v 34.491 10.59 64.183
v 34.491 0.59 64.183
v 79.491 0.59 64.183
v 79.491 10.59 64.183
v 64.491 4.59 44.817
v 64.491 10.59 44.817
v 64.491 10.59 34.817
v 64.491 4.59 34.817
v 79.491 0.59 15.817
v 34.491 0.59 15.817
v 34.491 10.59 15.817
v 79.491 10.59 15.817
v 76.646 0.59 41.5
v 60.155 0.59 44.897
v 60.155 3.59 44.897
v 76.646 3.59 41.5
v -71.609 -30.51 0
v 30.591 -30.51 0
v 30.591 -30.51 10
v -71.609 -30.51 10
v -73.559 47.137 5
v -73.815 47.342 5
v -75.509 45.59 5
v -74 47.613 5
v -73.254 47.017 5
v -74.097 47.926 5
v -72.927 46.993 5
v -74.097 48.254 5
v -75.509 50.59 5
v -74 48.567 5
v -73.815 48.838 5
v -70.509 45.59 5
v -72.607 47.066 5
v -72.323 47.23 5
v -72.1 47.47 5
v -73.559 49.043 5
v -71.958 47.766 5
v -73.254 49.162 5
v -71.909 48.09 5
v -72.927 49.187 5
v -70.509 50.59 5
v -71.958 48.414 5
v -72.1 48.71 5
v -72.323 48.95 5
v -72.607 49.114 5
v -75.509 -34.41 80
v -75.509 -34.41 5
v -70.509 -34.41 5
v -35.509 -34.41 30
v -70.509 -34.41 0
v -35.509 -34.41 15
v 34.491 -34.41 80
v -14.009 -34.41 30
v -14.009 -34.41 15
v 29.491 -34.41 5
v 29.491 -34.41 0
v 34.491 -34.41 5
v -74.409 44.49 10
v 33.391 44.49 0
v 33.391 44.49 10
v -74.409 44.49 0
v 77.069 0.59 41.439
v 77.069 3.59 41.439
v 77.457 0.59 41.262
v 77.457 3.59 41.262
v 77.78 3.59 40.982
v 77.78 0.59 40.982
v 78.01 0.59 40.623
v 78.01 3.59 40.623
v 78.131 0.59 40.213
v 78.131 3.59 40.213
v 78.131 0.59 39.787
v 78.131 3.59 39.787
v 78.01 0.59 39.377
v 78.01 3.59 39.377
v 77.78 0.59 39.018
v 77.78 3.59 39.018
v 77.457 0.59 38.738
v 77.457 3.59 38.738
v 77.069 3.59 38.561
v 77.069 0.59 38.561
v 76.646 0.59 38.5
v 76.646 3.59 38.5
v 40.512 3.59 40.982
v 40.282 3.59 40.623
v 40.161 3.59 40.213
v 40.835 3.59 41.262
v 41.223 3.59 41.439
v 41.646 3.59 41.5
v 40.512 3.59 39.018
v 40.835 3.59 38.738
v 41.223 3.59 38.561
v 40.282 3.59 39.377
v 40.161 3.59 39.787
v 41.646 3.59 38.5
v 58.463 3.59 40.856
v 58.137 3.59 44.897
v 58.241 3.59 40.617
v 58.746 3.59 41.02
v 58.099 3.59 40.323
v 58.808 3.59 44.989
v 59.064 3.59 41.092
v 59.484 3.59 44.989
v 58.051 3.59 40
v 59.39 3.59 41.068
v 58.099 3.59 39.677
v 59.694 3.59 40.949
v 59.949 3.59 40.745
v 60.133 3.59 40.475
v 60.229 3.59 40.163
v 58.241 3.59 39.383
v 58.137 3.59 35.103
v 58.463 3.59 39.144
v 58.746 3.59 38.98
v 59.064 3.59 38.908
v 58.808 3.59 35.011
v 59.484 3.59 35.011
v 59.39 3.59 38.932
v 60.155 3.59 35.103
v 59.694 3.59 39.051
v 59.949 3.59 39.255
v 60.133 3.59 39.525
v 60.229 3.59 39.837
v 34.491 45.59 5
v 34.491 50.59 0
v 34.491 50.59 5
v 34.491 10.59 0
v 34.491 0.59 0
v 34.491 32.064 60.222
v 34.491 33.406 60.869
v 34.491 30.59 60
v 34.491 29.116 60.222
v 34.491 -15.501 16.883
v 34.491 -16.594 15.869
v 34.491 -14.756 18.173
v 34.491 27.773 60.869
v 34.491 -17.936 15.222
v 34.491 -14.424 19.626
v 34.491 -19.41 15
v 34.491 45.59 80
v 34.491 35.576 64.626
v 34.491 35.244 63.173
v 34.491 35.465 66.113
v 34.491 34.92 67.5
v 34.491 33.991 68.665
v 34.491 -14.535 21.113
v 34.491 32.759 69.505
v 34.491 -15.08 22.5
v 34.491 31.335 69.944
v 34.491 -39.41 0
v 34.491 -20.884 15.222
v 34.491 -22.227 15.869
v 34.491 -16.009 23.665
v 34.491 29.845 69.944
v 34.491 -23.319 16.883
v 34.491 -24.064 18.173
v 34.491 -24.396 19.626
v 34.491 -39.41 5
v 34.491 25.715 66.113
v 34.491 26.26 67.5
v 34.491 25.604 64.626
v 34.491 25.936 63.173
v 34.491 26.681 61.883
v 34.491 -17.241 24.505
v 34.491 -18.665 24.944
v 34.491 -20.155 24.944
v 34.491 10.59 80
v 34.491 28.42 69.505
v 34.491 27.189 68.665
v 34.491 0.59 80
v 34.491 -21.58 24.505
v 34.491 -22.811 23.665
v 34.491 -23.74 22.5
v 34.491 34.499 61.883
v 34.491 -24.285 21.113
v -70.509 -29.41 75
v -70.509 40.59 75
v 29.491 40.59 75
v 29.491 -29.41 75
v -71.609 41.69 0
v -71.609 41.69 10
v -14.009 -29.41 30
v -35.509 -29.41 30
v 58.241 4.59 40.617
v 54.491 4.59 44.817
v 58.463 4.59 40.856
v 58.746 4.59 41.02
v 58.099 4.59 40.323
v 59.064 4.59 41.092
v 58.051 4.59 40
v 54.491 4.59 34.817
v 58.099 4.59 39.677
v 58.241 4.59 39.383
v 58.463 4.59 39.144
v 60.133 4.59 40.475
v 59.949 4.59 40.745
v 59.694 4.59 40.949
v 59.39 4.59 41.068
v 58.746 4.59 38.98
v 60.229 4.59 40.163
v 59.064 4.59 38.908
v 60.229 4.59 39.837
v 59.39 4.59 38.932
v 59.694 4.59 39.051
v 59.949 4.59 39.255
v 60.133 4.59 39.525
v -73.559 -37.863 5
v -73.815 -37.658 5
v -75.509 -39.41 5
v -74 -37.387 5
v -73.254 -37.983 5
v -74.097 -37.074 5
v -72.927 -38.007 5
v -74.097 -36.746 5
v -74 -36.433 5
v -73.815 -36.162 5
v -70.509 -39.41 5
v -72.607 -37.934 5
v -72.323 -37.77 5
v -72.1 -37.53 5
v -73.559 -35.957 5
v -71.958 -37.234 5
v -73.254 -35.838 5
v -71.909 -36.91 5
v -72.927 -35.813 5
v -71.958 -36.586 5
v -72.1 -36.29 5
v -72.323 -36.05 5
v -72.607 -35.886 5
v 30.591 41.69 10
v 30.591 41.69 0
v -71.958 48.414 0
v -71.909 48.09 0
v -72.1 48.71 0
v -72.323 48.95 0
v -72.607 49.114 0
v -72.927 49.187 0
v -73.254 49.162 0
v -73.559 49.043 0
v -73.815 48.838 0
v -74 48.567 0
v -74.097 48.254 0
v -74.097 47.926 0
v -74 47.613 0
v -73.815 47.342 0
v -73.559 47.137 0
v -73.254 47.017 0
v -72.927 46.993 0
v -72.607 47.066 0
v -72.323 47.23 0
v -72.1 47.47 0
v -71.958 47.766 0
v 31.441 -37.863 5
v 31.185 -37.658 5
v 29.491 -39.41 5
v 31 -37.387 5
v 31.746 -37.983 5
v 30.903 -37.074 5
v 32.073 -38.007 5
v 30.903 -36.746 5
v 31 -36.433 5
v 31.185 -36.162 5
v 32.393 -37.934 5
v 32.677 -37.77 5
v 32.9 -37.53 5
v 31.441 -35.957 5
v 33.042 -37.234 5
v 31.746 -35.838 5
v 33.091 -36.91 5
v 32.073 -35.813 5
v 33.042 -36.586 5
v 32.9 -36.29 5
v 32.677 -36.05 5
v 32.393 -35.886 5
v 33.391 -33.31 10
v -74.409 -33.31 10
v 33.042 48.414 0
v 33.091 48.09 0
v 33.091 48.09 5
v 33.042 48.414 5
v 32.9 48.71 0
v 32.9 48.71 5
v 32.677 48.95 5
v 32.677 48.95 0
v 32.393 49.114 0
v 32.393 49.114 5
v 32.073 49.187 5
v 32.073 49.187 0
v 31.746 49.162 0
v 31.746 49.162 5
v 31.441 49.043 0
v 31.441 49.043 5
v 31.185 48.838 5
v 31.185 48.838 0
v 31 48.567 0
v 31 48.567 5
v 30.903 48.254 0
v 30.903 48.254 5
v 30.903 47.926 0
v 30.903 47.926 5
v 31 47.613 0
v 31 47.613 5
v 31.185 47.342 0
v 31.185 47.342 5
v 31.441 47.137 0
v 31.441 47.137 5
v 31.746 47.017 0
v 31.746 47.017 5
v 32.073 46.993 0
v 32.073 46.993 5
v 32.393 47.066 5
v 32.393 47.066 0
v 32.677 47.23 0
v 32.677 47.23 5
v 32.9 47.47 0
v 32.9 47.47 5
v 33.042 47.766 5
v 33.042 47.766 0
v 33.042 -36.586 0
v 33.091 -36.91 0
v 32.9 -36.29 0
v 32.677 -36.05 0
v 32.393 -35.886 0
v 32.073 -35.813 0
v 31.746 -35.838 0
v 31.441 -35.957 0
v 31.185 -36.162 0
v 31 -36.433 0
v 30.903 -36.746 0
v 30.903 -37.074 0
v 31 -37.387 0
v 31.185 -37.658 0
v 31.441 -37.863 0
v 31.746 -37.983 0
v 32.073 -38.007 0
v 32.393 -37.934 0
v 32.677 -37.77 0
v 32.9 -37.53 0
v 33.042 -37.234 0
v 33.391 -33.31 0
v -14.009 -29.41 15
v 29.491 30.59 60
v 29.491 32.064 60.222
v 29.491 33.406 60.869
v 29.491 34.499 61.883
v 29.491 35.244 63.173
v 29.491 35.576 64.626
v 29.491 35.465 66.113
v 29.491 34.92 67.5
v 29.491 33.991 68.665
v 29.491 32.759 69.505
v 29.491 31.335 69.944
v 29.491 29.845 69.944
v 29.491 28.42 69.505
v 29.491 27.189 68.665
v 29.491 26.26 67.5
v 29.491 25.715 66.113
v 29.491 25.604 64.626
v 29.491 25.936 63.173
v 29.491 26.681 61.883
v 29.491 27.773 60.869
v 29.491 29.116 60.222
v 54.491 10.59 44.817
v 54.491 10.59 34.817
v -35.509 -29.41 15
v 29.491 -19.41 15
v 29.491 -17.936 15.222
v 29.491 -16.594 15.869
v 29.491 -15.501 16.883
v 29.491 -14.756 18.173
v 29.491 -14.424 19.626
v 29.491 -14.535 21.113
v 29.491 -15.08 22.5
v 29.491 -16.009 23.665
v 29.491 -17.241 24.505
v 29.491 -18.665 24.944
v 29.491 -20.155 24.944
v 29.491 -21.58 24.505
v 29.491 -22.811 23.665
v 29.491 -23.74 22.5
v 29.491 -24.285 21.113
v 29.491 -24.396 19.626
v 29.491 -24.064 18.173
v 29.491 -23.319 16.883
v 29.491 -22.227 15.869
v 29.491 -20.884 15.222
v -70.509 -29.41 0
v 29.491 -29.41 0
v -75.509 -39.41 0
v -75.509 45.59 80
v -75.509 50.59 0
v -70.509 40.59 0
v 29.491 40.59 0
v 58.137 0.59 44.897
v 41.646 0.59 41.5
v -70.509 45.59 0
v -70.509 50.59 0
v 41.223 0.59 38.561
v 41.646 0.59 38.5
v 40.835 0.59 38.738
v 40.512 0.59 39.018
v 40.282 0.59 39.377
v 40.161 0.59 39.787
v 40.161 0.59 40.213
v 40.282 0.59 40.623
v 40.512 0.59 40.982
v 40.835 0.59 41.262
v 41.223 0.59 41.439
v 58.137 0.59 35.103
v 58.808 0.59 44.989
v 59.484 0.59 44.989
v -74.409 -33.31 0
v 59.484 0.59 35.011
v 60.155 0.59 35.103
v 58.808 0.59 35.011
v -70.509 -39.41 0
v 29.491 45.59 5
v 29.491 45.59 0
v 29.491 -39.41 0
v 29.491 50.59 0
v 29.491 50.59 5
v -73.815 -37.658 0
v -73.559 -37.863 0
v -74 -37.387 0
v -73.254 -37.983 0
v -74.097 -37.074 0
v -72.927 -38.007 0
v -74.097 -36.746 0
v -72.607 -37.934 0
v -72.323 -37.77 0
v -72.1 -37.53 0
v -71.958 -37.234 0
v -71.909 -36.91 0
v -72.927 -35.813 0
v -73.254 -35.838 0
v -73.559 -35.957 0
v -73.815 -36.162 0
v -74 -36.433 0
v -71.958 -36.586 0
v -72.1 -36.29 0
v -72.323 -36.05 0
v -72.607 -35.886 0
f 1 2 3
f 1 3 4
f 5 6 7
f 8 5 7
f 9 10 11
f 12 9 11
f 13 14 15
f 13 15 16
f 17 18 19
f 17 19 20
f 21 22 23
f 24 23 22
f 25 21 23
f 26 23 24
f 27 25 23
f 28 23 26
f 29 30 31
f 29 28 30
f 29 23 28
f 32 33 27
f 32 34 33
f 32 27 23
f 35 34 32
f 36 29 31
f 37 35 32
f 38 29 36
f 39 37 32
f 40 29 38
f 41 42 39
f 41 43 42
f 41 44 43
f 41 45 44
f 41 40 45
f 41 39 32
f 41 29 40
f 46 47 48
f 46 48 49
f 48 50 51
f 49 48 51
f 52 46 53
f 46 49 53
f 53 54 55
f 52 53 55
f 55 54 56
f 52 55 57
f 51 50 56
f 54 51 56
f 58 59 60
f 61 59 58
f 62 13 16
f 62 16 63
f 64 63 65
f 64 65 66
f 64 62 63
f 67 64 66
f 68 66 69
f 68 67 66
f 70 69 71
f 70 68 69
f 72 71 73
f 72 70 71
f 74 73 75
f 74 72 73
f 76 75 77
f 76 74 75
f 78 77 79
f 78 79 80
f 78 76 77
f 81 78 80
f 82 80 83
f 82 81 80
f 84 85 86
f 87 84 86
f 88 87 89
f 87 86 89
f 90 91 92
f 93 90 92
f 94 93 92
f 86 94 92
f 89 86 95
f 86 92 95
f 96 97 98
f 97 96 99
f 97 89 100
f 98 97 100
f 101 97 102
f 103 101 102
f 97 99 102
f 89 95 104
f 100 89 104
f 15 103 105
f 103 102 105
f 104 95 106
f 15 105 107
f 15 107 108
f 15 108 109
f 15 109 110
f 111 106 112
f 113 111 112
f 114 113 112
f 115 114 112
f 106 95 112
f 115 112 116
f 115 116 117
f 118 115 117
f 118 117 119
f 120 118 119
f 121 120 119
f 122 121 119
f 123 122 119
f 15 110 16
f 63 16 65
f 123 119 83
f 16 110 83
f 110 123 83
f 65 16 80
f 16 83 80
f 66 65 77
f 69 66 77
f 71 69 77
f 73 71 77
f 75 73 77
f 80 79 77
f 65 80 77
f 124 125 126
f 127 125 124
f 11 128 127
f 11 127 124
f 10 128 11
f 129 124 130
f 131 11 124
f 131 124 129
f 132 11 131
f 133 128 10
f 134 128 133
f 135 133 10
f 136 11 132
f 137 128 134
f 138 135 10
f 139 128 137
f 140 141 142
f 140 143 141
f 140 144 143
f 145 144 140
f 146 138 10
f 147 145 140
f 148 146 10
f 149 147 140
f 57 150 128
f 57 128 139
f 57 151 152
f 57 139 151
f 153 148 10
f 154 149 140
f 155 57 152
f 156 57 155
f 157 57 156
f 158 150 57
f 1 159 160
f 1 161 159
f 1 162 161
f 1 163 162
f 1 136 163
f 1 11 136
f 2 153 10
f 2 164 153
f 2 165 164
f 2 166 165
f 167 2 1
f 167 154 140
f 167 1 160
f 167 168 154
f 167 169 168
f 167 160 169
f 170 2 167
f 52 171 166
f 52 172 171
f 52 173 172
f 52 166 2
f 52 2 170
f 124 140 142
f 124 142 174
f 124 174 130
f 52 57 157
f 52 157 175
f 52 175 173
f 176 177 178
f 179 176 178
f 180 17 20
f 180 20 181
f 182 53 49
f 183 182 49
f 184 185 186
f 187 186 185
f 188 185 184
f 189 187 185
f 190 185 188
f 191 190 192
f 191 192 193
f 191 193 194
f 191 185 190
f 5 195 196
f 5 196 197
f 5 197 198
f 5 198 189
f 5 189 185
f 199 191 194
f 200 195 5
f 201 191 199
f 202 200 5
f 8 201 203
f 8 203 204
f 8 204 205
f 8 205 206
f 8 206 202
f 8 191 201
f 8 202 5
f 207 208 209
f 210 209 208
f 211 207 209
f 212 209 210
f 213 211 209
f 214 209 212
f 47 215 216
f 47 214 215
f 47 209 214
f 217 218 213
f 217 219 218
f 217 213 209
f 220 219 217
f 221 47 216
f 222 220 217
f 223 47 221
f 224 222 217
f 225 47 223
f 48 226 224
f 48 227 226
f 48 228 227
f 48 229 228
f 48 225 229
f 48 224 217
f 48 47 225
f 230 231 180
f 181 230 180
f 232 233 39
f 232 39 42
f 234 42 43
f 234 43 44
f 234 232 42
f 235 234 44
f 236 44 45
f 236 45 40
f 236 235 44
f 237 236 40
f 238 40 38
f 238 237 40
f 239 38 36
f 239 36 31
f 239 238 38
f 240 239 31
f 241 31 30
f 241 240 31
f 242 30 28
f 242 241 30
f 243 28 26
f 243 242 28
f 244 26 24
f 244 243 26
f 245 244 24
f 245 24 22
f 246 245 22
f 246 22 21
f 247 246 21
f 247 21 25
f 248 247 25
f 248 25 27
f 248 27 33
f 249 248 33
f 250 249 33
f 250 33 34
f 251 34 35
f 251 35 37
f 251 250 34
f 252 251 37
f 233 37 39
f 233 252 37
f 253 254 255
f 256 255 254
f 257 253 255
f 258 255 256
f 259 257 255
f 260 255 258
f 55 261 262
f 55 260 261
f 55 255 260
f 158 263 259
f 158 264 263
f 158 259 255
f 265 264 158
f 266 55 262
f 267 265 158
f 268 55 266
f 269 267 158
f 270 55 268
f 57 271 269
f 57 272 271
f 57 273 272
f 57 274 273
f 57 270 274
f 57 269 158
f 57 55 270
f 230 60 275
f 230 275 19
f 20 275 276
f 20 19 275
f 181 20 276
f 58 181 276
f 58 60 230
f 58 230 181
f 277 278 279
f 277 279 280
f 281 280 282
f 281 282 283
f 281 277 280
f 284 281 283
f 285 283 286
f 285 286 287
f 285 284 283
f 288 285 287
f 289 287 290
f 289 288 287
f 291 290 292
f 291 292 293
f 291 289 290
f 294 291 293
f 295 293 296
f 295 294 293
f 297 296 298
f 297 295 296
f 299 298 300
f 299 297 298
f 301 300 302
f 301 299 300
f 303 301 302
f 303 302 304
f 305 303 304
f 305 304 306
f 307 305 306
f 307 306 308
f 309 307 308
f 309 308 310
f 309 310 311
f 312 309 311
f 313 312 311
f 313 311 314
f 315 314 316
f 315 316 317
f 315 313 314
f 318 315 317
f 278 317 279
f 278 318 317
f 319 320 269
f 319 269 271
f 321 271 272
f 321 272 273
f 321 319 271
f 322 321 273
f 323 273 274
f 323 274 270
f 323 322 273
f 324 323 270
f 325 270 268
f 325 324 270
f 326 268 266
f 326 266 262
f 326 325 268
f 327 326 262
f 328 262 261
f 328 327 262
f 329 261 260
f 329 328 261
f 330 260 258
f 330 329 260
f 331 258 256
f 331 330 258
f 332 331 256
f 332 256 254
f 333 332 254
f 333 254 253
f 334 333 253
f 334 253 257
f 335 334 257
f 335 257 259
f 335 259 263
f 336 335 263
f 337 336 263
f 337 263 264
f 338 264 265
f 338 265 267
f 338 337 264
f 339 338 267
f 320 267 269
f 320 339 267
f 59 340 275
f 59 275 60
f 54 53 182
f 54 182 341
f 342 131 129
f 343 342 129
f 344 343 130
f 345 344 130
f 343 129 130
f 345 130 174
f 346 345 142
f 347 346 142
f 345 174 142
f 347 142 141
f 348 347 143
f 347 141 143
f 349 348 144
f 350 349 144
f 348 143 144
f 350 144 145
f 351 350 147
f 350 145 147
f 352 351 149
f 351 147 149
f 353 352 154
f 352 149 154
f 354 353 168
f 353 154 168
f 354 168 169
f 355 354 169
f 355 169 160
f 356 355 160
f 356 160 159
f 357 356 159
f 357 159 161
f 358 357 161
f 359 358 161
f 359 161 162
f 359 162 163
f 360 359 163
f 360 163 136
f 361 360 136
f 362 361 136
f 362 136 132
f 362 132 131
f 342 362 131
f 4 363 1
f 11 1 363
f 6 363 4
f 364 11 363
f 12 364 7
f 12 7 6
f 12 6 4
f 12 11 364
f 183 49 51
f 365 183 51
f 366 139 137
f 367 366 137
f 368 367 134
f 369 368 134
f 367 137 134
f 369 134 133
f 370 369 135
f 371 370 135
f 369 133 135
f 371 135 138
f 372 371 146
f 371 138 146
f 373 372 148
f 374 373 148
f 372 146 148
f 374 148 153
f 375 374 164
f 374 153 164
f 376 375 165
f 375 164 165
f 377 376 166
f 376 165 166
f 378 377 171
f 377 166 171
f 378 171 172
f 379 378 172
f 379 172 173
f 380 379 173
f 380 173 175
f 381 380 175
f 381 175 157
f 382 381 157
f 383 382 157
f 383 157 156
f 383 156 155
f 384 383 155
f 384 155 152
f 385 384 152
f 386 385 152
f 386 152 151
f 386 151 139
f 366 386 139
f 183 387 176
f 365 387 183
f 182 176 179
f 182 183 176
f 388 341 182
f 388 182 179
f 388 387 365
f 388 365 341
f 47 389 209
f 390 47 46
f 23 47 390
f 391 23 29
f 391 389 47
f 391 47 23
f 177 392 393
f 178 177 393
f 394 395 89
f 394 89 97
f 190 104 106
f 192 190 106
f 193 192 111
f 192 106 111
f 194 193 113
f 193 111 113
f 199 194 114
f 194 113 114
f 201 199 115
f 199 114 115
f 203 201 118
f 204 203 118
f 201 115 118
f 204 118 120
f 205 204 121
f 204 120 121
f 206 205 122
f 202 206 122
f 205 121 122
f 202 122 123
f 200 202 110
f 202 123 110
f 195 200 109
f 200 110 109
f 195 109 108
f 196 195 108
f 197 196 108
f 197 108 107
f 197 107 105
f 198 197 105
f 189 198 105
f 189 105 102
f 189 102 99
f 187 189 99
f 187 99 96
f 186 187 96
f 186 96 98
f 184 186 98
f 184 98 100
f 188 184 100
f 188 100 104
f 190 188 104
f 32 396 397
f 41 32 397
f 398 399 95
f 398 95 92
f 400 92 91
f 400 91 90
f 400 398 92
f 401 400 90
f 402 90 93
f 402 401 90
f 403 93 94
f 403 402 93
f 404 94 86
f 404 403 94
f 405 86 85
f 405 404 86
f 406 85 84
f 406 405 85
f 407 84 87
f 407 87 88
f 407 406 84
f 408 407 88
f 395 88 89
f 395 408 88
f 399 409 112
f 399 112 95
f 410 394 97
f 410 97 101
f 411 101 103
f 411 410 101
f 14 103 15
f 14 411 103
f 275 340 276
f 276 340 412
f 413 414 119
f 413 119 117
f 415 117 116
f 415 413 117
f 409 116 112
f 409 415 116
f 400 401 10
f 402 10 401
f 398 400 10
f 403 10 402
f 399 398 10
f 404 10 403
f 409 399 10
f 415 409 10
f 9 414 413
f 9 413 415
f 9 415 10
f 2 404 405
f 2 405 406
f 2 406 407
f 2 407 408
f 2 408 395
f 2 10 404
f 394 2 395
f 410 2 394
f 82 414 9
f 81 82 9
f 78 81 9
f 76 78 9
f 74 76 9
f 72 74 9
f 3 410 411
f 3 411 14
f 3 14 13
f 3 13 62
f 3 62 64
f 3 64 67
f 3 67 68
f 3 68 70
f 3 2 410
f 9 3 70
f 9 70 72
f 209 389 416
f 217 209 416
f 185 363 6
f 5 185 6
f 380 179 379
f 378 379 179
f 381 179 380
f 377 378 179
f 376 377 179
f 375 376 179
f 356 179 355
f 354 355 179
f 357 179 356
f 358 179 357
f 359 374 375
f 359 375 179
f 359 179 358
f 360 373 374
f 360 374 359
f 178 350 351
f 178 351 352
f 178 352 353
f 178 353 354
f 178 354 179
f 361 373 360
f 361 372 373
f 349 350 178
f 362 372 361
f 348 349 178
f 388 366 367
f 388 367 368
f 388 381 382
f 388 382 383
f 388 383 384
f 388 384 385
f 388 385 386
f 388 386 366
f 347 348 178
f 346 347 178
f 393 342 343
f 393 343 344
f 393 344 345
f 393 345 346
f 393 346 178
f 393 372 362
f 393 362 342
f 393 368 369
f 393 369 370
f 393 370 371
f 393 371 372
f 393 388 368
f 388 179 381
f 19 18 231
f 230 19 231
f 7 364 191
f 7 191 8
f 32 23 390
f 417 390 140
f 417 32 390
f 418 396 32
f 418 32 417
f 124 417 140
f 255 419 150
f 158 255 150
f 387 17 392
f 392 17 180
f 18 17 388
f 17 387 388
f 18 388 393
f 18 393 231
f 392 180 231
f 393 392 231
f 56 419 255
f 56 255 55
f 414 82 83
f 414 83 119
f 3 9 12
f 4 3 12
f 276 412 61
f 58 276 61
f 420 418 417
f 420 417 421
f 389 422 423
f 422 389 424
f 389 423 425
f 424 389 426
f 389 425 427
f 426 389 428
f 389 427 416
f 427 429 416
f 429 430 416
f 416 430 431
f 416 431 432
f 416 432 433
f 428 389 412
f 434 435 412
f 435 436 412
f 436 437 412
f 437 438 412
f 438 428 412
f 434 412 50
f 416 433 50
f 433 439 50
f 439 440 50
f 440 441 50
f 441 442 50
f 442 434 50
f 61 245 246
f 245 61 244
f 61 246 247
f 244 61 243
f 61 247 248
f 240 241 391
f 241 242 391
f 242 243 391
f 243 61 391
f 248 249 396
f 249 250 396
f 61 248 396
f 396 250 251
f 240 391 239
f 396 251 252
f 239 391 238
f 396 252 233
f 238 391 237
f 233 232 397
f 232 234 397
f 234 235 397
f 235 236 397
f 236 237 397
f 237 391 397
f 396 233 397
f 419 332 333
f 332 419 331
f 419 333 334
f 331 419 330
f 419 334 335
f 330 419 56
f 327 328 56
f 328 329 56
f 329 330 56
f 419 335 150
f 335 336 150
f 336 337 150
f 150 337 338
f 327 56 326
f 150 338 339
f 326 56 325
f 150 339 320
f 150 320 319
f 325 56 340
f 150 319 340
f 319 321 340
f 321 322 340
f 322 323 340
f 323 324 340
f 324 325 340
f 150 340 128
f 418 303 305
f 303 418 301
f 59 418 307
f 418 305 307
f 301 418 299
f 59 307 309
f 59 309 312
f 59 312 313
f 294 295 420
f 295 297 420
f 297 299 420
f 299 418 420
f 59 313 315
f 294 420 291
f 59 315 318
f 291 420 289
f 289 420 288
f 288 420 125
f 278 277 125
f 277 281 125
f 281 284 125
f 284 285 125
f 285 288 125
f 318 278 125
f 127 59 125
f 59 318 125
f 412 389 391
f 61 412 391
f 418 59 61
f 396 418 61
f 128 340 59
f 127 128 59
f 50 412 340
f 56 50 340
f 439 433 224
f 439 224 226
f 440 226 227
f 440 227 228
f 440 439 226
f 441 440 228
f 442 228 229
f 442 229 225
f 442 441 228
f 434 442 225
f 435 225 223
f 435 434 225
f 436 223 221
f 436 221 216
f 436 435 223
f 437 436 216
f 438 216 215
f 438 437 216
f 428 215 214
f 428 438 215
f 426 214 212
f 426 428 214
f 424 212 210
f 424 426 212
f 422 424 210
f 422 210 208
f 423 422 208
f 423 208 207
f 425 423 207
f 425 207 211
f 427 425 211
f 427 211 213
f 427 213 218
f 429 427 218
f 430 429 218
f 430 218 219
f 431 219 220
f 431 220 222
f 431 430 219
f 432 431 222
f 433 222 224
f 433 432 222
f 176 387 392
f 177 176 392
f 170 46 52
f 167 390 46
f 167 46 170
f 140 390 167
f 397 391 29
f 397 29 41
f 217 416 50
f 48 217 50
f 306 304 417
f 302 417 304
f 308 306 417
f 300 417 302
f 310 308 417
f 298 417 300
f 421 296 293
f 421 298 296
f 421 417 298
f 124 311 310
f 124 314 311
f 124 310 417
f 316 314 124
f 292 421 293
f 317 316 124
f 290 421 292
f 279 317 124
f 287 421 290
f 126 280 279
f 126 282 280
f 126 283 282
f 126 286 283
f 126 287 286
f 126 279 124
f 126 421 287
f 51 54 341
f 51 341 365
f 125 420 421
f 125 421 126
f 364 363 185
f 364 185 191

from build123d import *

# Parameters (mm, degrees)
SKETCH_1_W           = 155
SKETCH_1_H           = 80
EXTRUDE_1_DEPTH      = 80
SKETCH_6_W           = 45
SKETCH_6_H           = 80
CUT_EXTRUDE_1_DEPTH  = 35
SKETCH_5_W           = 45
SKETCH_5_H           = 80
CUT_EXTRUDE_2_DEPTH  = 35
SKETCH_7_W           = 100
SKETCH_7_H           = 70
CUT_EXTRUDE_3_DEPTH  = 75
SKETCH_8_W           = 107.8
SKETCH_8_H           = 77.8
SKETCH_8_W_2         = 102.2
SKETCH_8_H_2         = 72.2
CUT_EXTRUDE_4_DEPTH  = 10
SKETCH_9_R           = 5
CUT_EXTRUDE_5_DEPTH  = 10
SKETCH_10_W          = 21.5
SKETCH_10_H          = 15
CUT_EXTRUDE_6_DEPTH  = 10
SKETCH_12_W          = 15.816906699
SKETCH_12_H          = 10
CUT_EXTRUDE_7_DEPTH  = 45
CUT_EXTRUDE_8_DEPTH  = 3
SKETCH_15_W          = 10
SKETCH_15_H          = 10
CUT_EXTRUDE_9_DEPTH  = 6
SKETCH_17_R          = 1.095275866
CUT_EXTRUDE_11_DEPTH = 7
SKETCH_18_W          = 5
SKETCH_18_H          = 5
SKETCH_18_R          = 1.1
EXTRUDE_2_DEPTH      = 5


with BuildPart() as part:
    # 草圖1 → 填料-伸長1 (new body)
    with BuildSketch(Plane.XY):
        with Locations((1.991097826, 5.58988764)):
            Rectangle(SKETCH_1_W, SKETCH_1_H)
    extrude(amount=EXTRUDE_1_DEPTH)

    # 草圖6 → 除料-伸長1 (cut)
    with BuildSketch(Plane(origin=(0, 45.58988764, 0), x_dir=(1, 0, 0), z_dir=(0, 1, 0))):
        with Locations((56.991097826, -40)):
            Rectangle(SKETCH_6_W, SKETCH_6_H)
    extrude(amount=-CUT_EXTRUDE_1_DEPTH, mode=Mode.SUBTRACT)

    # 草圖5 → 除料-伸長2 (cut)
    with BuildSketch(Plane.XZ.offset(34.41011236)):
        with Locations((56.991097826, 40)):
            Rectangle(SKETCH_5_W, SKETCH_5_H)
    extrude(amount=-CUT_EXTRUDE_2_DEPTH, mode=Mode.SUBTRACT)

    # 草圖7 → 除料-伸長3 (cut)
    with BuildSketch(Plane.XY):
        with Locations((-20.508902174, 5.58988764)):
            Rectangle(SKETCH_7_W, SKETCH_7_H)
    extrude(amount=CUT_EXTRUDE_3_DEPTH, mode=Mode.SUBTRACT)

    # 草圖8 → 除料-伸長4 (cut)
    with BuildSketch(Plane(origin=(0, 0, 0), x_dir=(-1, 0, 0), z_dir=(0, 0, -1))):
        with Locations((20.508902174, 5.58988764)):
            Rectangle(SKETCH_8_W, SKETCH_8_H)
        with Locations((20.508902174, 5.58988764)):
            Rectangle(SKETCH_8_W_2, SKETCH_8_H_2, mode=Mode.SUBTRACT)
    extrude(amount=-CUT_EXTRUDE_4_DEPTH, mode=Mode.SUBTRACT)

    # 草圖9 → 除料-伸長5 (cut)
    with BuildSketch(Plane(origin=(34.491097826, 0, 0), x_dir=(0, 0, -1), z_dir=(1, 0, 0))):
        with Locations((-65, 30.58988764)):
            Circle(SKETCH_9_R)
        with Locations((-20, -19.41011236)):
            Circle(SKETCH_9_R)
    extrude(amount=-CUT_EXTRUDE_5_DEPTH, mode=Mode.SUBTRACT)

    # 草圖10 → 除料-伸長6 (cut)
    with BuildSketch(Plane(origin=(0, -34.41011236, 0), x_dir=(-1, 0, 0), z_dir=(0, -1, 0))):
        with Locations((24.758902174, -22.5)):
            Rectangle(SKETCH_10_W, SKETCH_10_H)
    extrude(amount=-CUT_EXTRUDE_6_DEPTH, mode=Mode.SUBTRACT)

    # 草圖12 → 除料-伸長7 (cut)
    with BuildSketch(Plane(origin=(34.491097826, 0, 0), x_dir=(0, 0, -1), z_dir=(1, 0, 0))):
        with Locations((-72.09154665, 5.58988764)):
            Rectangle(SKETCH_12_W, SKETCH_12_H)
        with Locations((-7.90845335, 5.58988764)):
            Rectangle(SKETCH_12_W, SKETCH_12_H)
    extrude(amount=CUT_EXTRUDE_7_DEPTH, mode=Mode.SUBTRACT)

    # 草圖14 → 除料-伸長8 (cut)
    with BuildSketch(Plane(origin=(0, 0.58988764, 0), x_dir=(-1, 0, 0), z_dir=(0, -1, 0))):
        with BuildLine():
            Line((-58.137150435, -35.10282789), (-41.645964254, -38.5))
            ThreePointArc((-41.645964254, -38.5), (-40.145964254, -40), (-41.645964254, -41.5))
            Line((-41.645964254, -41.5), (-58.137150435, -44.89717211))
            ThreePointArc((-58.137150435, -44.89717211), (-59.145964254, -45), (-60.154778073, -44.89717211))
            Line((-60.154778073, -44.89717211), (-76.645964254, -41.5))
            ThreePointArc((-76.645964254, -41.5), (-78.145964254, -40), (-76.645964254, -38.5))
            Line((-76.645964254, -38.5), (-60.154778073, -35.10282789))
            ThreePointArc((-60.154778073, -35.10282789), (-59.145964254, -35), (-58.137150435, -35.10282789))
        make_face()
    extrude(amount=-CUT_EXTRUDE_8_DEPTH, mode=Mode.SUBTRACT)

    # 草圖15 → 除料-伸長9 (cut)
    with BuildSketch(Plane(origin=(0, 10.58988764, 0), x_dir=(1, 0, 0), z_dir=(0, 1, 0))):
        with Locations((59.491097826, -39.816906699)):
            Rectangle(SKETCH_15_W, SKETCH_15_H)
    extrude(amount=-CUT_EXTRUDE_9_DEPTH, mode=Mode.SUBTRACT)

    # 草圖17 → 除料-伸長11 (cut)
    with BuildSketch(Plane(origin=(0, 0.58988764, 0), x_dir=(-1, 0, 0), z_dir=(0, -1, 0))):
        with Locations((-59.145964254, -40)):
            Circle(SKETCH_17_R)
    extrude(amount=-CUT_EXTRUDE_11_DEPTH, mode=Mode.SUBTRACT)

    # 草圖18 → 填料-伸長2 (add)
    with BuildSketch(Plane.XY):
        with Locations((31.991097826, 48.08988764)):
            Rectangle(SKETCH_18_W, SKETCH_18_H)
        with Locations((31.991097826, 48.08988764)):
            Circle(SKETCH_18_R, mode=Mode.SUBTRACT)
        with Locations((-73.008902174, 48.08988764)):
            Rectangle(SKETCH_18_W, SKETCH_18_H)
        with Locations((-73.008902174, 48.08988764)):
            Circle(SKETCH_18_R, mode=Mode.SUBTRACT)
        with Locations((-73.008902174, -36.91011236)):
            Rectangle(SKETCH_18_W, SKETCH_18_H)
        with Locations((-73.008902174, -36.91011236)):
            Circle(SKETCH_18_R, mode=Mode.SUBTRACT)
        with Locations((31.991097826, -36.91011236)):
            Rectangle(SKETCH_18_W, SKETCH_18_H)
        with Locations((31.991097826, -36.91011236)):
            Circle(SKETCH_18_R, mode=Mode.SUBTRACT)
    extrude(amount=EXTRUDE_2_DEPTH)


solid = part.part
